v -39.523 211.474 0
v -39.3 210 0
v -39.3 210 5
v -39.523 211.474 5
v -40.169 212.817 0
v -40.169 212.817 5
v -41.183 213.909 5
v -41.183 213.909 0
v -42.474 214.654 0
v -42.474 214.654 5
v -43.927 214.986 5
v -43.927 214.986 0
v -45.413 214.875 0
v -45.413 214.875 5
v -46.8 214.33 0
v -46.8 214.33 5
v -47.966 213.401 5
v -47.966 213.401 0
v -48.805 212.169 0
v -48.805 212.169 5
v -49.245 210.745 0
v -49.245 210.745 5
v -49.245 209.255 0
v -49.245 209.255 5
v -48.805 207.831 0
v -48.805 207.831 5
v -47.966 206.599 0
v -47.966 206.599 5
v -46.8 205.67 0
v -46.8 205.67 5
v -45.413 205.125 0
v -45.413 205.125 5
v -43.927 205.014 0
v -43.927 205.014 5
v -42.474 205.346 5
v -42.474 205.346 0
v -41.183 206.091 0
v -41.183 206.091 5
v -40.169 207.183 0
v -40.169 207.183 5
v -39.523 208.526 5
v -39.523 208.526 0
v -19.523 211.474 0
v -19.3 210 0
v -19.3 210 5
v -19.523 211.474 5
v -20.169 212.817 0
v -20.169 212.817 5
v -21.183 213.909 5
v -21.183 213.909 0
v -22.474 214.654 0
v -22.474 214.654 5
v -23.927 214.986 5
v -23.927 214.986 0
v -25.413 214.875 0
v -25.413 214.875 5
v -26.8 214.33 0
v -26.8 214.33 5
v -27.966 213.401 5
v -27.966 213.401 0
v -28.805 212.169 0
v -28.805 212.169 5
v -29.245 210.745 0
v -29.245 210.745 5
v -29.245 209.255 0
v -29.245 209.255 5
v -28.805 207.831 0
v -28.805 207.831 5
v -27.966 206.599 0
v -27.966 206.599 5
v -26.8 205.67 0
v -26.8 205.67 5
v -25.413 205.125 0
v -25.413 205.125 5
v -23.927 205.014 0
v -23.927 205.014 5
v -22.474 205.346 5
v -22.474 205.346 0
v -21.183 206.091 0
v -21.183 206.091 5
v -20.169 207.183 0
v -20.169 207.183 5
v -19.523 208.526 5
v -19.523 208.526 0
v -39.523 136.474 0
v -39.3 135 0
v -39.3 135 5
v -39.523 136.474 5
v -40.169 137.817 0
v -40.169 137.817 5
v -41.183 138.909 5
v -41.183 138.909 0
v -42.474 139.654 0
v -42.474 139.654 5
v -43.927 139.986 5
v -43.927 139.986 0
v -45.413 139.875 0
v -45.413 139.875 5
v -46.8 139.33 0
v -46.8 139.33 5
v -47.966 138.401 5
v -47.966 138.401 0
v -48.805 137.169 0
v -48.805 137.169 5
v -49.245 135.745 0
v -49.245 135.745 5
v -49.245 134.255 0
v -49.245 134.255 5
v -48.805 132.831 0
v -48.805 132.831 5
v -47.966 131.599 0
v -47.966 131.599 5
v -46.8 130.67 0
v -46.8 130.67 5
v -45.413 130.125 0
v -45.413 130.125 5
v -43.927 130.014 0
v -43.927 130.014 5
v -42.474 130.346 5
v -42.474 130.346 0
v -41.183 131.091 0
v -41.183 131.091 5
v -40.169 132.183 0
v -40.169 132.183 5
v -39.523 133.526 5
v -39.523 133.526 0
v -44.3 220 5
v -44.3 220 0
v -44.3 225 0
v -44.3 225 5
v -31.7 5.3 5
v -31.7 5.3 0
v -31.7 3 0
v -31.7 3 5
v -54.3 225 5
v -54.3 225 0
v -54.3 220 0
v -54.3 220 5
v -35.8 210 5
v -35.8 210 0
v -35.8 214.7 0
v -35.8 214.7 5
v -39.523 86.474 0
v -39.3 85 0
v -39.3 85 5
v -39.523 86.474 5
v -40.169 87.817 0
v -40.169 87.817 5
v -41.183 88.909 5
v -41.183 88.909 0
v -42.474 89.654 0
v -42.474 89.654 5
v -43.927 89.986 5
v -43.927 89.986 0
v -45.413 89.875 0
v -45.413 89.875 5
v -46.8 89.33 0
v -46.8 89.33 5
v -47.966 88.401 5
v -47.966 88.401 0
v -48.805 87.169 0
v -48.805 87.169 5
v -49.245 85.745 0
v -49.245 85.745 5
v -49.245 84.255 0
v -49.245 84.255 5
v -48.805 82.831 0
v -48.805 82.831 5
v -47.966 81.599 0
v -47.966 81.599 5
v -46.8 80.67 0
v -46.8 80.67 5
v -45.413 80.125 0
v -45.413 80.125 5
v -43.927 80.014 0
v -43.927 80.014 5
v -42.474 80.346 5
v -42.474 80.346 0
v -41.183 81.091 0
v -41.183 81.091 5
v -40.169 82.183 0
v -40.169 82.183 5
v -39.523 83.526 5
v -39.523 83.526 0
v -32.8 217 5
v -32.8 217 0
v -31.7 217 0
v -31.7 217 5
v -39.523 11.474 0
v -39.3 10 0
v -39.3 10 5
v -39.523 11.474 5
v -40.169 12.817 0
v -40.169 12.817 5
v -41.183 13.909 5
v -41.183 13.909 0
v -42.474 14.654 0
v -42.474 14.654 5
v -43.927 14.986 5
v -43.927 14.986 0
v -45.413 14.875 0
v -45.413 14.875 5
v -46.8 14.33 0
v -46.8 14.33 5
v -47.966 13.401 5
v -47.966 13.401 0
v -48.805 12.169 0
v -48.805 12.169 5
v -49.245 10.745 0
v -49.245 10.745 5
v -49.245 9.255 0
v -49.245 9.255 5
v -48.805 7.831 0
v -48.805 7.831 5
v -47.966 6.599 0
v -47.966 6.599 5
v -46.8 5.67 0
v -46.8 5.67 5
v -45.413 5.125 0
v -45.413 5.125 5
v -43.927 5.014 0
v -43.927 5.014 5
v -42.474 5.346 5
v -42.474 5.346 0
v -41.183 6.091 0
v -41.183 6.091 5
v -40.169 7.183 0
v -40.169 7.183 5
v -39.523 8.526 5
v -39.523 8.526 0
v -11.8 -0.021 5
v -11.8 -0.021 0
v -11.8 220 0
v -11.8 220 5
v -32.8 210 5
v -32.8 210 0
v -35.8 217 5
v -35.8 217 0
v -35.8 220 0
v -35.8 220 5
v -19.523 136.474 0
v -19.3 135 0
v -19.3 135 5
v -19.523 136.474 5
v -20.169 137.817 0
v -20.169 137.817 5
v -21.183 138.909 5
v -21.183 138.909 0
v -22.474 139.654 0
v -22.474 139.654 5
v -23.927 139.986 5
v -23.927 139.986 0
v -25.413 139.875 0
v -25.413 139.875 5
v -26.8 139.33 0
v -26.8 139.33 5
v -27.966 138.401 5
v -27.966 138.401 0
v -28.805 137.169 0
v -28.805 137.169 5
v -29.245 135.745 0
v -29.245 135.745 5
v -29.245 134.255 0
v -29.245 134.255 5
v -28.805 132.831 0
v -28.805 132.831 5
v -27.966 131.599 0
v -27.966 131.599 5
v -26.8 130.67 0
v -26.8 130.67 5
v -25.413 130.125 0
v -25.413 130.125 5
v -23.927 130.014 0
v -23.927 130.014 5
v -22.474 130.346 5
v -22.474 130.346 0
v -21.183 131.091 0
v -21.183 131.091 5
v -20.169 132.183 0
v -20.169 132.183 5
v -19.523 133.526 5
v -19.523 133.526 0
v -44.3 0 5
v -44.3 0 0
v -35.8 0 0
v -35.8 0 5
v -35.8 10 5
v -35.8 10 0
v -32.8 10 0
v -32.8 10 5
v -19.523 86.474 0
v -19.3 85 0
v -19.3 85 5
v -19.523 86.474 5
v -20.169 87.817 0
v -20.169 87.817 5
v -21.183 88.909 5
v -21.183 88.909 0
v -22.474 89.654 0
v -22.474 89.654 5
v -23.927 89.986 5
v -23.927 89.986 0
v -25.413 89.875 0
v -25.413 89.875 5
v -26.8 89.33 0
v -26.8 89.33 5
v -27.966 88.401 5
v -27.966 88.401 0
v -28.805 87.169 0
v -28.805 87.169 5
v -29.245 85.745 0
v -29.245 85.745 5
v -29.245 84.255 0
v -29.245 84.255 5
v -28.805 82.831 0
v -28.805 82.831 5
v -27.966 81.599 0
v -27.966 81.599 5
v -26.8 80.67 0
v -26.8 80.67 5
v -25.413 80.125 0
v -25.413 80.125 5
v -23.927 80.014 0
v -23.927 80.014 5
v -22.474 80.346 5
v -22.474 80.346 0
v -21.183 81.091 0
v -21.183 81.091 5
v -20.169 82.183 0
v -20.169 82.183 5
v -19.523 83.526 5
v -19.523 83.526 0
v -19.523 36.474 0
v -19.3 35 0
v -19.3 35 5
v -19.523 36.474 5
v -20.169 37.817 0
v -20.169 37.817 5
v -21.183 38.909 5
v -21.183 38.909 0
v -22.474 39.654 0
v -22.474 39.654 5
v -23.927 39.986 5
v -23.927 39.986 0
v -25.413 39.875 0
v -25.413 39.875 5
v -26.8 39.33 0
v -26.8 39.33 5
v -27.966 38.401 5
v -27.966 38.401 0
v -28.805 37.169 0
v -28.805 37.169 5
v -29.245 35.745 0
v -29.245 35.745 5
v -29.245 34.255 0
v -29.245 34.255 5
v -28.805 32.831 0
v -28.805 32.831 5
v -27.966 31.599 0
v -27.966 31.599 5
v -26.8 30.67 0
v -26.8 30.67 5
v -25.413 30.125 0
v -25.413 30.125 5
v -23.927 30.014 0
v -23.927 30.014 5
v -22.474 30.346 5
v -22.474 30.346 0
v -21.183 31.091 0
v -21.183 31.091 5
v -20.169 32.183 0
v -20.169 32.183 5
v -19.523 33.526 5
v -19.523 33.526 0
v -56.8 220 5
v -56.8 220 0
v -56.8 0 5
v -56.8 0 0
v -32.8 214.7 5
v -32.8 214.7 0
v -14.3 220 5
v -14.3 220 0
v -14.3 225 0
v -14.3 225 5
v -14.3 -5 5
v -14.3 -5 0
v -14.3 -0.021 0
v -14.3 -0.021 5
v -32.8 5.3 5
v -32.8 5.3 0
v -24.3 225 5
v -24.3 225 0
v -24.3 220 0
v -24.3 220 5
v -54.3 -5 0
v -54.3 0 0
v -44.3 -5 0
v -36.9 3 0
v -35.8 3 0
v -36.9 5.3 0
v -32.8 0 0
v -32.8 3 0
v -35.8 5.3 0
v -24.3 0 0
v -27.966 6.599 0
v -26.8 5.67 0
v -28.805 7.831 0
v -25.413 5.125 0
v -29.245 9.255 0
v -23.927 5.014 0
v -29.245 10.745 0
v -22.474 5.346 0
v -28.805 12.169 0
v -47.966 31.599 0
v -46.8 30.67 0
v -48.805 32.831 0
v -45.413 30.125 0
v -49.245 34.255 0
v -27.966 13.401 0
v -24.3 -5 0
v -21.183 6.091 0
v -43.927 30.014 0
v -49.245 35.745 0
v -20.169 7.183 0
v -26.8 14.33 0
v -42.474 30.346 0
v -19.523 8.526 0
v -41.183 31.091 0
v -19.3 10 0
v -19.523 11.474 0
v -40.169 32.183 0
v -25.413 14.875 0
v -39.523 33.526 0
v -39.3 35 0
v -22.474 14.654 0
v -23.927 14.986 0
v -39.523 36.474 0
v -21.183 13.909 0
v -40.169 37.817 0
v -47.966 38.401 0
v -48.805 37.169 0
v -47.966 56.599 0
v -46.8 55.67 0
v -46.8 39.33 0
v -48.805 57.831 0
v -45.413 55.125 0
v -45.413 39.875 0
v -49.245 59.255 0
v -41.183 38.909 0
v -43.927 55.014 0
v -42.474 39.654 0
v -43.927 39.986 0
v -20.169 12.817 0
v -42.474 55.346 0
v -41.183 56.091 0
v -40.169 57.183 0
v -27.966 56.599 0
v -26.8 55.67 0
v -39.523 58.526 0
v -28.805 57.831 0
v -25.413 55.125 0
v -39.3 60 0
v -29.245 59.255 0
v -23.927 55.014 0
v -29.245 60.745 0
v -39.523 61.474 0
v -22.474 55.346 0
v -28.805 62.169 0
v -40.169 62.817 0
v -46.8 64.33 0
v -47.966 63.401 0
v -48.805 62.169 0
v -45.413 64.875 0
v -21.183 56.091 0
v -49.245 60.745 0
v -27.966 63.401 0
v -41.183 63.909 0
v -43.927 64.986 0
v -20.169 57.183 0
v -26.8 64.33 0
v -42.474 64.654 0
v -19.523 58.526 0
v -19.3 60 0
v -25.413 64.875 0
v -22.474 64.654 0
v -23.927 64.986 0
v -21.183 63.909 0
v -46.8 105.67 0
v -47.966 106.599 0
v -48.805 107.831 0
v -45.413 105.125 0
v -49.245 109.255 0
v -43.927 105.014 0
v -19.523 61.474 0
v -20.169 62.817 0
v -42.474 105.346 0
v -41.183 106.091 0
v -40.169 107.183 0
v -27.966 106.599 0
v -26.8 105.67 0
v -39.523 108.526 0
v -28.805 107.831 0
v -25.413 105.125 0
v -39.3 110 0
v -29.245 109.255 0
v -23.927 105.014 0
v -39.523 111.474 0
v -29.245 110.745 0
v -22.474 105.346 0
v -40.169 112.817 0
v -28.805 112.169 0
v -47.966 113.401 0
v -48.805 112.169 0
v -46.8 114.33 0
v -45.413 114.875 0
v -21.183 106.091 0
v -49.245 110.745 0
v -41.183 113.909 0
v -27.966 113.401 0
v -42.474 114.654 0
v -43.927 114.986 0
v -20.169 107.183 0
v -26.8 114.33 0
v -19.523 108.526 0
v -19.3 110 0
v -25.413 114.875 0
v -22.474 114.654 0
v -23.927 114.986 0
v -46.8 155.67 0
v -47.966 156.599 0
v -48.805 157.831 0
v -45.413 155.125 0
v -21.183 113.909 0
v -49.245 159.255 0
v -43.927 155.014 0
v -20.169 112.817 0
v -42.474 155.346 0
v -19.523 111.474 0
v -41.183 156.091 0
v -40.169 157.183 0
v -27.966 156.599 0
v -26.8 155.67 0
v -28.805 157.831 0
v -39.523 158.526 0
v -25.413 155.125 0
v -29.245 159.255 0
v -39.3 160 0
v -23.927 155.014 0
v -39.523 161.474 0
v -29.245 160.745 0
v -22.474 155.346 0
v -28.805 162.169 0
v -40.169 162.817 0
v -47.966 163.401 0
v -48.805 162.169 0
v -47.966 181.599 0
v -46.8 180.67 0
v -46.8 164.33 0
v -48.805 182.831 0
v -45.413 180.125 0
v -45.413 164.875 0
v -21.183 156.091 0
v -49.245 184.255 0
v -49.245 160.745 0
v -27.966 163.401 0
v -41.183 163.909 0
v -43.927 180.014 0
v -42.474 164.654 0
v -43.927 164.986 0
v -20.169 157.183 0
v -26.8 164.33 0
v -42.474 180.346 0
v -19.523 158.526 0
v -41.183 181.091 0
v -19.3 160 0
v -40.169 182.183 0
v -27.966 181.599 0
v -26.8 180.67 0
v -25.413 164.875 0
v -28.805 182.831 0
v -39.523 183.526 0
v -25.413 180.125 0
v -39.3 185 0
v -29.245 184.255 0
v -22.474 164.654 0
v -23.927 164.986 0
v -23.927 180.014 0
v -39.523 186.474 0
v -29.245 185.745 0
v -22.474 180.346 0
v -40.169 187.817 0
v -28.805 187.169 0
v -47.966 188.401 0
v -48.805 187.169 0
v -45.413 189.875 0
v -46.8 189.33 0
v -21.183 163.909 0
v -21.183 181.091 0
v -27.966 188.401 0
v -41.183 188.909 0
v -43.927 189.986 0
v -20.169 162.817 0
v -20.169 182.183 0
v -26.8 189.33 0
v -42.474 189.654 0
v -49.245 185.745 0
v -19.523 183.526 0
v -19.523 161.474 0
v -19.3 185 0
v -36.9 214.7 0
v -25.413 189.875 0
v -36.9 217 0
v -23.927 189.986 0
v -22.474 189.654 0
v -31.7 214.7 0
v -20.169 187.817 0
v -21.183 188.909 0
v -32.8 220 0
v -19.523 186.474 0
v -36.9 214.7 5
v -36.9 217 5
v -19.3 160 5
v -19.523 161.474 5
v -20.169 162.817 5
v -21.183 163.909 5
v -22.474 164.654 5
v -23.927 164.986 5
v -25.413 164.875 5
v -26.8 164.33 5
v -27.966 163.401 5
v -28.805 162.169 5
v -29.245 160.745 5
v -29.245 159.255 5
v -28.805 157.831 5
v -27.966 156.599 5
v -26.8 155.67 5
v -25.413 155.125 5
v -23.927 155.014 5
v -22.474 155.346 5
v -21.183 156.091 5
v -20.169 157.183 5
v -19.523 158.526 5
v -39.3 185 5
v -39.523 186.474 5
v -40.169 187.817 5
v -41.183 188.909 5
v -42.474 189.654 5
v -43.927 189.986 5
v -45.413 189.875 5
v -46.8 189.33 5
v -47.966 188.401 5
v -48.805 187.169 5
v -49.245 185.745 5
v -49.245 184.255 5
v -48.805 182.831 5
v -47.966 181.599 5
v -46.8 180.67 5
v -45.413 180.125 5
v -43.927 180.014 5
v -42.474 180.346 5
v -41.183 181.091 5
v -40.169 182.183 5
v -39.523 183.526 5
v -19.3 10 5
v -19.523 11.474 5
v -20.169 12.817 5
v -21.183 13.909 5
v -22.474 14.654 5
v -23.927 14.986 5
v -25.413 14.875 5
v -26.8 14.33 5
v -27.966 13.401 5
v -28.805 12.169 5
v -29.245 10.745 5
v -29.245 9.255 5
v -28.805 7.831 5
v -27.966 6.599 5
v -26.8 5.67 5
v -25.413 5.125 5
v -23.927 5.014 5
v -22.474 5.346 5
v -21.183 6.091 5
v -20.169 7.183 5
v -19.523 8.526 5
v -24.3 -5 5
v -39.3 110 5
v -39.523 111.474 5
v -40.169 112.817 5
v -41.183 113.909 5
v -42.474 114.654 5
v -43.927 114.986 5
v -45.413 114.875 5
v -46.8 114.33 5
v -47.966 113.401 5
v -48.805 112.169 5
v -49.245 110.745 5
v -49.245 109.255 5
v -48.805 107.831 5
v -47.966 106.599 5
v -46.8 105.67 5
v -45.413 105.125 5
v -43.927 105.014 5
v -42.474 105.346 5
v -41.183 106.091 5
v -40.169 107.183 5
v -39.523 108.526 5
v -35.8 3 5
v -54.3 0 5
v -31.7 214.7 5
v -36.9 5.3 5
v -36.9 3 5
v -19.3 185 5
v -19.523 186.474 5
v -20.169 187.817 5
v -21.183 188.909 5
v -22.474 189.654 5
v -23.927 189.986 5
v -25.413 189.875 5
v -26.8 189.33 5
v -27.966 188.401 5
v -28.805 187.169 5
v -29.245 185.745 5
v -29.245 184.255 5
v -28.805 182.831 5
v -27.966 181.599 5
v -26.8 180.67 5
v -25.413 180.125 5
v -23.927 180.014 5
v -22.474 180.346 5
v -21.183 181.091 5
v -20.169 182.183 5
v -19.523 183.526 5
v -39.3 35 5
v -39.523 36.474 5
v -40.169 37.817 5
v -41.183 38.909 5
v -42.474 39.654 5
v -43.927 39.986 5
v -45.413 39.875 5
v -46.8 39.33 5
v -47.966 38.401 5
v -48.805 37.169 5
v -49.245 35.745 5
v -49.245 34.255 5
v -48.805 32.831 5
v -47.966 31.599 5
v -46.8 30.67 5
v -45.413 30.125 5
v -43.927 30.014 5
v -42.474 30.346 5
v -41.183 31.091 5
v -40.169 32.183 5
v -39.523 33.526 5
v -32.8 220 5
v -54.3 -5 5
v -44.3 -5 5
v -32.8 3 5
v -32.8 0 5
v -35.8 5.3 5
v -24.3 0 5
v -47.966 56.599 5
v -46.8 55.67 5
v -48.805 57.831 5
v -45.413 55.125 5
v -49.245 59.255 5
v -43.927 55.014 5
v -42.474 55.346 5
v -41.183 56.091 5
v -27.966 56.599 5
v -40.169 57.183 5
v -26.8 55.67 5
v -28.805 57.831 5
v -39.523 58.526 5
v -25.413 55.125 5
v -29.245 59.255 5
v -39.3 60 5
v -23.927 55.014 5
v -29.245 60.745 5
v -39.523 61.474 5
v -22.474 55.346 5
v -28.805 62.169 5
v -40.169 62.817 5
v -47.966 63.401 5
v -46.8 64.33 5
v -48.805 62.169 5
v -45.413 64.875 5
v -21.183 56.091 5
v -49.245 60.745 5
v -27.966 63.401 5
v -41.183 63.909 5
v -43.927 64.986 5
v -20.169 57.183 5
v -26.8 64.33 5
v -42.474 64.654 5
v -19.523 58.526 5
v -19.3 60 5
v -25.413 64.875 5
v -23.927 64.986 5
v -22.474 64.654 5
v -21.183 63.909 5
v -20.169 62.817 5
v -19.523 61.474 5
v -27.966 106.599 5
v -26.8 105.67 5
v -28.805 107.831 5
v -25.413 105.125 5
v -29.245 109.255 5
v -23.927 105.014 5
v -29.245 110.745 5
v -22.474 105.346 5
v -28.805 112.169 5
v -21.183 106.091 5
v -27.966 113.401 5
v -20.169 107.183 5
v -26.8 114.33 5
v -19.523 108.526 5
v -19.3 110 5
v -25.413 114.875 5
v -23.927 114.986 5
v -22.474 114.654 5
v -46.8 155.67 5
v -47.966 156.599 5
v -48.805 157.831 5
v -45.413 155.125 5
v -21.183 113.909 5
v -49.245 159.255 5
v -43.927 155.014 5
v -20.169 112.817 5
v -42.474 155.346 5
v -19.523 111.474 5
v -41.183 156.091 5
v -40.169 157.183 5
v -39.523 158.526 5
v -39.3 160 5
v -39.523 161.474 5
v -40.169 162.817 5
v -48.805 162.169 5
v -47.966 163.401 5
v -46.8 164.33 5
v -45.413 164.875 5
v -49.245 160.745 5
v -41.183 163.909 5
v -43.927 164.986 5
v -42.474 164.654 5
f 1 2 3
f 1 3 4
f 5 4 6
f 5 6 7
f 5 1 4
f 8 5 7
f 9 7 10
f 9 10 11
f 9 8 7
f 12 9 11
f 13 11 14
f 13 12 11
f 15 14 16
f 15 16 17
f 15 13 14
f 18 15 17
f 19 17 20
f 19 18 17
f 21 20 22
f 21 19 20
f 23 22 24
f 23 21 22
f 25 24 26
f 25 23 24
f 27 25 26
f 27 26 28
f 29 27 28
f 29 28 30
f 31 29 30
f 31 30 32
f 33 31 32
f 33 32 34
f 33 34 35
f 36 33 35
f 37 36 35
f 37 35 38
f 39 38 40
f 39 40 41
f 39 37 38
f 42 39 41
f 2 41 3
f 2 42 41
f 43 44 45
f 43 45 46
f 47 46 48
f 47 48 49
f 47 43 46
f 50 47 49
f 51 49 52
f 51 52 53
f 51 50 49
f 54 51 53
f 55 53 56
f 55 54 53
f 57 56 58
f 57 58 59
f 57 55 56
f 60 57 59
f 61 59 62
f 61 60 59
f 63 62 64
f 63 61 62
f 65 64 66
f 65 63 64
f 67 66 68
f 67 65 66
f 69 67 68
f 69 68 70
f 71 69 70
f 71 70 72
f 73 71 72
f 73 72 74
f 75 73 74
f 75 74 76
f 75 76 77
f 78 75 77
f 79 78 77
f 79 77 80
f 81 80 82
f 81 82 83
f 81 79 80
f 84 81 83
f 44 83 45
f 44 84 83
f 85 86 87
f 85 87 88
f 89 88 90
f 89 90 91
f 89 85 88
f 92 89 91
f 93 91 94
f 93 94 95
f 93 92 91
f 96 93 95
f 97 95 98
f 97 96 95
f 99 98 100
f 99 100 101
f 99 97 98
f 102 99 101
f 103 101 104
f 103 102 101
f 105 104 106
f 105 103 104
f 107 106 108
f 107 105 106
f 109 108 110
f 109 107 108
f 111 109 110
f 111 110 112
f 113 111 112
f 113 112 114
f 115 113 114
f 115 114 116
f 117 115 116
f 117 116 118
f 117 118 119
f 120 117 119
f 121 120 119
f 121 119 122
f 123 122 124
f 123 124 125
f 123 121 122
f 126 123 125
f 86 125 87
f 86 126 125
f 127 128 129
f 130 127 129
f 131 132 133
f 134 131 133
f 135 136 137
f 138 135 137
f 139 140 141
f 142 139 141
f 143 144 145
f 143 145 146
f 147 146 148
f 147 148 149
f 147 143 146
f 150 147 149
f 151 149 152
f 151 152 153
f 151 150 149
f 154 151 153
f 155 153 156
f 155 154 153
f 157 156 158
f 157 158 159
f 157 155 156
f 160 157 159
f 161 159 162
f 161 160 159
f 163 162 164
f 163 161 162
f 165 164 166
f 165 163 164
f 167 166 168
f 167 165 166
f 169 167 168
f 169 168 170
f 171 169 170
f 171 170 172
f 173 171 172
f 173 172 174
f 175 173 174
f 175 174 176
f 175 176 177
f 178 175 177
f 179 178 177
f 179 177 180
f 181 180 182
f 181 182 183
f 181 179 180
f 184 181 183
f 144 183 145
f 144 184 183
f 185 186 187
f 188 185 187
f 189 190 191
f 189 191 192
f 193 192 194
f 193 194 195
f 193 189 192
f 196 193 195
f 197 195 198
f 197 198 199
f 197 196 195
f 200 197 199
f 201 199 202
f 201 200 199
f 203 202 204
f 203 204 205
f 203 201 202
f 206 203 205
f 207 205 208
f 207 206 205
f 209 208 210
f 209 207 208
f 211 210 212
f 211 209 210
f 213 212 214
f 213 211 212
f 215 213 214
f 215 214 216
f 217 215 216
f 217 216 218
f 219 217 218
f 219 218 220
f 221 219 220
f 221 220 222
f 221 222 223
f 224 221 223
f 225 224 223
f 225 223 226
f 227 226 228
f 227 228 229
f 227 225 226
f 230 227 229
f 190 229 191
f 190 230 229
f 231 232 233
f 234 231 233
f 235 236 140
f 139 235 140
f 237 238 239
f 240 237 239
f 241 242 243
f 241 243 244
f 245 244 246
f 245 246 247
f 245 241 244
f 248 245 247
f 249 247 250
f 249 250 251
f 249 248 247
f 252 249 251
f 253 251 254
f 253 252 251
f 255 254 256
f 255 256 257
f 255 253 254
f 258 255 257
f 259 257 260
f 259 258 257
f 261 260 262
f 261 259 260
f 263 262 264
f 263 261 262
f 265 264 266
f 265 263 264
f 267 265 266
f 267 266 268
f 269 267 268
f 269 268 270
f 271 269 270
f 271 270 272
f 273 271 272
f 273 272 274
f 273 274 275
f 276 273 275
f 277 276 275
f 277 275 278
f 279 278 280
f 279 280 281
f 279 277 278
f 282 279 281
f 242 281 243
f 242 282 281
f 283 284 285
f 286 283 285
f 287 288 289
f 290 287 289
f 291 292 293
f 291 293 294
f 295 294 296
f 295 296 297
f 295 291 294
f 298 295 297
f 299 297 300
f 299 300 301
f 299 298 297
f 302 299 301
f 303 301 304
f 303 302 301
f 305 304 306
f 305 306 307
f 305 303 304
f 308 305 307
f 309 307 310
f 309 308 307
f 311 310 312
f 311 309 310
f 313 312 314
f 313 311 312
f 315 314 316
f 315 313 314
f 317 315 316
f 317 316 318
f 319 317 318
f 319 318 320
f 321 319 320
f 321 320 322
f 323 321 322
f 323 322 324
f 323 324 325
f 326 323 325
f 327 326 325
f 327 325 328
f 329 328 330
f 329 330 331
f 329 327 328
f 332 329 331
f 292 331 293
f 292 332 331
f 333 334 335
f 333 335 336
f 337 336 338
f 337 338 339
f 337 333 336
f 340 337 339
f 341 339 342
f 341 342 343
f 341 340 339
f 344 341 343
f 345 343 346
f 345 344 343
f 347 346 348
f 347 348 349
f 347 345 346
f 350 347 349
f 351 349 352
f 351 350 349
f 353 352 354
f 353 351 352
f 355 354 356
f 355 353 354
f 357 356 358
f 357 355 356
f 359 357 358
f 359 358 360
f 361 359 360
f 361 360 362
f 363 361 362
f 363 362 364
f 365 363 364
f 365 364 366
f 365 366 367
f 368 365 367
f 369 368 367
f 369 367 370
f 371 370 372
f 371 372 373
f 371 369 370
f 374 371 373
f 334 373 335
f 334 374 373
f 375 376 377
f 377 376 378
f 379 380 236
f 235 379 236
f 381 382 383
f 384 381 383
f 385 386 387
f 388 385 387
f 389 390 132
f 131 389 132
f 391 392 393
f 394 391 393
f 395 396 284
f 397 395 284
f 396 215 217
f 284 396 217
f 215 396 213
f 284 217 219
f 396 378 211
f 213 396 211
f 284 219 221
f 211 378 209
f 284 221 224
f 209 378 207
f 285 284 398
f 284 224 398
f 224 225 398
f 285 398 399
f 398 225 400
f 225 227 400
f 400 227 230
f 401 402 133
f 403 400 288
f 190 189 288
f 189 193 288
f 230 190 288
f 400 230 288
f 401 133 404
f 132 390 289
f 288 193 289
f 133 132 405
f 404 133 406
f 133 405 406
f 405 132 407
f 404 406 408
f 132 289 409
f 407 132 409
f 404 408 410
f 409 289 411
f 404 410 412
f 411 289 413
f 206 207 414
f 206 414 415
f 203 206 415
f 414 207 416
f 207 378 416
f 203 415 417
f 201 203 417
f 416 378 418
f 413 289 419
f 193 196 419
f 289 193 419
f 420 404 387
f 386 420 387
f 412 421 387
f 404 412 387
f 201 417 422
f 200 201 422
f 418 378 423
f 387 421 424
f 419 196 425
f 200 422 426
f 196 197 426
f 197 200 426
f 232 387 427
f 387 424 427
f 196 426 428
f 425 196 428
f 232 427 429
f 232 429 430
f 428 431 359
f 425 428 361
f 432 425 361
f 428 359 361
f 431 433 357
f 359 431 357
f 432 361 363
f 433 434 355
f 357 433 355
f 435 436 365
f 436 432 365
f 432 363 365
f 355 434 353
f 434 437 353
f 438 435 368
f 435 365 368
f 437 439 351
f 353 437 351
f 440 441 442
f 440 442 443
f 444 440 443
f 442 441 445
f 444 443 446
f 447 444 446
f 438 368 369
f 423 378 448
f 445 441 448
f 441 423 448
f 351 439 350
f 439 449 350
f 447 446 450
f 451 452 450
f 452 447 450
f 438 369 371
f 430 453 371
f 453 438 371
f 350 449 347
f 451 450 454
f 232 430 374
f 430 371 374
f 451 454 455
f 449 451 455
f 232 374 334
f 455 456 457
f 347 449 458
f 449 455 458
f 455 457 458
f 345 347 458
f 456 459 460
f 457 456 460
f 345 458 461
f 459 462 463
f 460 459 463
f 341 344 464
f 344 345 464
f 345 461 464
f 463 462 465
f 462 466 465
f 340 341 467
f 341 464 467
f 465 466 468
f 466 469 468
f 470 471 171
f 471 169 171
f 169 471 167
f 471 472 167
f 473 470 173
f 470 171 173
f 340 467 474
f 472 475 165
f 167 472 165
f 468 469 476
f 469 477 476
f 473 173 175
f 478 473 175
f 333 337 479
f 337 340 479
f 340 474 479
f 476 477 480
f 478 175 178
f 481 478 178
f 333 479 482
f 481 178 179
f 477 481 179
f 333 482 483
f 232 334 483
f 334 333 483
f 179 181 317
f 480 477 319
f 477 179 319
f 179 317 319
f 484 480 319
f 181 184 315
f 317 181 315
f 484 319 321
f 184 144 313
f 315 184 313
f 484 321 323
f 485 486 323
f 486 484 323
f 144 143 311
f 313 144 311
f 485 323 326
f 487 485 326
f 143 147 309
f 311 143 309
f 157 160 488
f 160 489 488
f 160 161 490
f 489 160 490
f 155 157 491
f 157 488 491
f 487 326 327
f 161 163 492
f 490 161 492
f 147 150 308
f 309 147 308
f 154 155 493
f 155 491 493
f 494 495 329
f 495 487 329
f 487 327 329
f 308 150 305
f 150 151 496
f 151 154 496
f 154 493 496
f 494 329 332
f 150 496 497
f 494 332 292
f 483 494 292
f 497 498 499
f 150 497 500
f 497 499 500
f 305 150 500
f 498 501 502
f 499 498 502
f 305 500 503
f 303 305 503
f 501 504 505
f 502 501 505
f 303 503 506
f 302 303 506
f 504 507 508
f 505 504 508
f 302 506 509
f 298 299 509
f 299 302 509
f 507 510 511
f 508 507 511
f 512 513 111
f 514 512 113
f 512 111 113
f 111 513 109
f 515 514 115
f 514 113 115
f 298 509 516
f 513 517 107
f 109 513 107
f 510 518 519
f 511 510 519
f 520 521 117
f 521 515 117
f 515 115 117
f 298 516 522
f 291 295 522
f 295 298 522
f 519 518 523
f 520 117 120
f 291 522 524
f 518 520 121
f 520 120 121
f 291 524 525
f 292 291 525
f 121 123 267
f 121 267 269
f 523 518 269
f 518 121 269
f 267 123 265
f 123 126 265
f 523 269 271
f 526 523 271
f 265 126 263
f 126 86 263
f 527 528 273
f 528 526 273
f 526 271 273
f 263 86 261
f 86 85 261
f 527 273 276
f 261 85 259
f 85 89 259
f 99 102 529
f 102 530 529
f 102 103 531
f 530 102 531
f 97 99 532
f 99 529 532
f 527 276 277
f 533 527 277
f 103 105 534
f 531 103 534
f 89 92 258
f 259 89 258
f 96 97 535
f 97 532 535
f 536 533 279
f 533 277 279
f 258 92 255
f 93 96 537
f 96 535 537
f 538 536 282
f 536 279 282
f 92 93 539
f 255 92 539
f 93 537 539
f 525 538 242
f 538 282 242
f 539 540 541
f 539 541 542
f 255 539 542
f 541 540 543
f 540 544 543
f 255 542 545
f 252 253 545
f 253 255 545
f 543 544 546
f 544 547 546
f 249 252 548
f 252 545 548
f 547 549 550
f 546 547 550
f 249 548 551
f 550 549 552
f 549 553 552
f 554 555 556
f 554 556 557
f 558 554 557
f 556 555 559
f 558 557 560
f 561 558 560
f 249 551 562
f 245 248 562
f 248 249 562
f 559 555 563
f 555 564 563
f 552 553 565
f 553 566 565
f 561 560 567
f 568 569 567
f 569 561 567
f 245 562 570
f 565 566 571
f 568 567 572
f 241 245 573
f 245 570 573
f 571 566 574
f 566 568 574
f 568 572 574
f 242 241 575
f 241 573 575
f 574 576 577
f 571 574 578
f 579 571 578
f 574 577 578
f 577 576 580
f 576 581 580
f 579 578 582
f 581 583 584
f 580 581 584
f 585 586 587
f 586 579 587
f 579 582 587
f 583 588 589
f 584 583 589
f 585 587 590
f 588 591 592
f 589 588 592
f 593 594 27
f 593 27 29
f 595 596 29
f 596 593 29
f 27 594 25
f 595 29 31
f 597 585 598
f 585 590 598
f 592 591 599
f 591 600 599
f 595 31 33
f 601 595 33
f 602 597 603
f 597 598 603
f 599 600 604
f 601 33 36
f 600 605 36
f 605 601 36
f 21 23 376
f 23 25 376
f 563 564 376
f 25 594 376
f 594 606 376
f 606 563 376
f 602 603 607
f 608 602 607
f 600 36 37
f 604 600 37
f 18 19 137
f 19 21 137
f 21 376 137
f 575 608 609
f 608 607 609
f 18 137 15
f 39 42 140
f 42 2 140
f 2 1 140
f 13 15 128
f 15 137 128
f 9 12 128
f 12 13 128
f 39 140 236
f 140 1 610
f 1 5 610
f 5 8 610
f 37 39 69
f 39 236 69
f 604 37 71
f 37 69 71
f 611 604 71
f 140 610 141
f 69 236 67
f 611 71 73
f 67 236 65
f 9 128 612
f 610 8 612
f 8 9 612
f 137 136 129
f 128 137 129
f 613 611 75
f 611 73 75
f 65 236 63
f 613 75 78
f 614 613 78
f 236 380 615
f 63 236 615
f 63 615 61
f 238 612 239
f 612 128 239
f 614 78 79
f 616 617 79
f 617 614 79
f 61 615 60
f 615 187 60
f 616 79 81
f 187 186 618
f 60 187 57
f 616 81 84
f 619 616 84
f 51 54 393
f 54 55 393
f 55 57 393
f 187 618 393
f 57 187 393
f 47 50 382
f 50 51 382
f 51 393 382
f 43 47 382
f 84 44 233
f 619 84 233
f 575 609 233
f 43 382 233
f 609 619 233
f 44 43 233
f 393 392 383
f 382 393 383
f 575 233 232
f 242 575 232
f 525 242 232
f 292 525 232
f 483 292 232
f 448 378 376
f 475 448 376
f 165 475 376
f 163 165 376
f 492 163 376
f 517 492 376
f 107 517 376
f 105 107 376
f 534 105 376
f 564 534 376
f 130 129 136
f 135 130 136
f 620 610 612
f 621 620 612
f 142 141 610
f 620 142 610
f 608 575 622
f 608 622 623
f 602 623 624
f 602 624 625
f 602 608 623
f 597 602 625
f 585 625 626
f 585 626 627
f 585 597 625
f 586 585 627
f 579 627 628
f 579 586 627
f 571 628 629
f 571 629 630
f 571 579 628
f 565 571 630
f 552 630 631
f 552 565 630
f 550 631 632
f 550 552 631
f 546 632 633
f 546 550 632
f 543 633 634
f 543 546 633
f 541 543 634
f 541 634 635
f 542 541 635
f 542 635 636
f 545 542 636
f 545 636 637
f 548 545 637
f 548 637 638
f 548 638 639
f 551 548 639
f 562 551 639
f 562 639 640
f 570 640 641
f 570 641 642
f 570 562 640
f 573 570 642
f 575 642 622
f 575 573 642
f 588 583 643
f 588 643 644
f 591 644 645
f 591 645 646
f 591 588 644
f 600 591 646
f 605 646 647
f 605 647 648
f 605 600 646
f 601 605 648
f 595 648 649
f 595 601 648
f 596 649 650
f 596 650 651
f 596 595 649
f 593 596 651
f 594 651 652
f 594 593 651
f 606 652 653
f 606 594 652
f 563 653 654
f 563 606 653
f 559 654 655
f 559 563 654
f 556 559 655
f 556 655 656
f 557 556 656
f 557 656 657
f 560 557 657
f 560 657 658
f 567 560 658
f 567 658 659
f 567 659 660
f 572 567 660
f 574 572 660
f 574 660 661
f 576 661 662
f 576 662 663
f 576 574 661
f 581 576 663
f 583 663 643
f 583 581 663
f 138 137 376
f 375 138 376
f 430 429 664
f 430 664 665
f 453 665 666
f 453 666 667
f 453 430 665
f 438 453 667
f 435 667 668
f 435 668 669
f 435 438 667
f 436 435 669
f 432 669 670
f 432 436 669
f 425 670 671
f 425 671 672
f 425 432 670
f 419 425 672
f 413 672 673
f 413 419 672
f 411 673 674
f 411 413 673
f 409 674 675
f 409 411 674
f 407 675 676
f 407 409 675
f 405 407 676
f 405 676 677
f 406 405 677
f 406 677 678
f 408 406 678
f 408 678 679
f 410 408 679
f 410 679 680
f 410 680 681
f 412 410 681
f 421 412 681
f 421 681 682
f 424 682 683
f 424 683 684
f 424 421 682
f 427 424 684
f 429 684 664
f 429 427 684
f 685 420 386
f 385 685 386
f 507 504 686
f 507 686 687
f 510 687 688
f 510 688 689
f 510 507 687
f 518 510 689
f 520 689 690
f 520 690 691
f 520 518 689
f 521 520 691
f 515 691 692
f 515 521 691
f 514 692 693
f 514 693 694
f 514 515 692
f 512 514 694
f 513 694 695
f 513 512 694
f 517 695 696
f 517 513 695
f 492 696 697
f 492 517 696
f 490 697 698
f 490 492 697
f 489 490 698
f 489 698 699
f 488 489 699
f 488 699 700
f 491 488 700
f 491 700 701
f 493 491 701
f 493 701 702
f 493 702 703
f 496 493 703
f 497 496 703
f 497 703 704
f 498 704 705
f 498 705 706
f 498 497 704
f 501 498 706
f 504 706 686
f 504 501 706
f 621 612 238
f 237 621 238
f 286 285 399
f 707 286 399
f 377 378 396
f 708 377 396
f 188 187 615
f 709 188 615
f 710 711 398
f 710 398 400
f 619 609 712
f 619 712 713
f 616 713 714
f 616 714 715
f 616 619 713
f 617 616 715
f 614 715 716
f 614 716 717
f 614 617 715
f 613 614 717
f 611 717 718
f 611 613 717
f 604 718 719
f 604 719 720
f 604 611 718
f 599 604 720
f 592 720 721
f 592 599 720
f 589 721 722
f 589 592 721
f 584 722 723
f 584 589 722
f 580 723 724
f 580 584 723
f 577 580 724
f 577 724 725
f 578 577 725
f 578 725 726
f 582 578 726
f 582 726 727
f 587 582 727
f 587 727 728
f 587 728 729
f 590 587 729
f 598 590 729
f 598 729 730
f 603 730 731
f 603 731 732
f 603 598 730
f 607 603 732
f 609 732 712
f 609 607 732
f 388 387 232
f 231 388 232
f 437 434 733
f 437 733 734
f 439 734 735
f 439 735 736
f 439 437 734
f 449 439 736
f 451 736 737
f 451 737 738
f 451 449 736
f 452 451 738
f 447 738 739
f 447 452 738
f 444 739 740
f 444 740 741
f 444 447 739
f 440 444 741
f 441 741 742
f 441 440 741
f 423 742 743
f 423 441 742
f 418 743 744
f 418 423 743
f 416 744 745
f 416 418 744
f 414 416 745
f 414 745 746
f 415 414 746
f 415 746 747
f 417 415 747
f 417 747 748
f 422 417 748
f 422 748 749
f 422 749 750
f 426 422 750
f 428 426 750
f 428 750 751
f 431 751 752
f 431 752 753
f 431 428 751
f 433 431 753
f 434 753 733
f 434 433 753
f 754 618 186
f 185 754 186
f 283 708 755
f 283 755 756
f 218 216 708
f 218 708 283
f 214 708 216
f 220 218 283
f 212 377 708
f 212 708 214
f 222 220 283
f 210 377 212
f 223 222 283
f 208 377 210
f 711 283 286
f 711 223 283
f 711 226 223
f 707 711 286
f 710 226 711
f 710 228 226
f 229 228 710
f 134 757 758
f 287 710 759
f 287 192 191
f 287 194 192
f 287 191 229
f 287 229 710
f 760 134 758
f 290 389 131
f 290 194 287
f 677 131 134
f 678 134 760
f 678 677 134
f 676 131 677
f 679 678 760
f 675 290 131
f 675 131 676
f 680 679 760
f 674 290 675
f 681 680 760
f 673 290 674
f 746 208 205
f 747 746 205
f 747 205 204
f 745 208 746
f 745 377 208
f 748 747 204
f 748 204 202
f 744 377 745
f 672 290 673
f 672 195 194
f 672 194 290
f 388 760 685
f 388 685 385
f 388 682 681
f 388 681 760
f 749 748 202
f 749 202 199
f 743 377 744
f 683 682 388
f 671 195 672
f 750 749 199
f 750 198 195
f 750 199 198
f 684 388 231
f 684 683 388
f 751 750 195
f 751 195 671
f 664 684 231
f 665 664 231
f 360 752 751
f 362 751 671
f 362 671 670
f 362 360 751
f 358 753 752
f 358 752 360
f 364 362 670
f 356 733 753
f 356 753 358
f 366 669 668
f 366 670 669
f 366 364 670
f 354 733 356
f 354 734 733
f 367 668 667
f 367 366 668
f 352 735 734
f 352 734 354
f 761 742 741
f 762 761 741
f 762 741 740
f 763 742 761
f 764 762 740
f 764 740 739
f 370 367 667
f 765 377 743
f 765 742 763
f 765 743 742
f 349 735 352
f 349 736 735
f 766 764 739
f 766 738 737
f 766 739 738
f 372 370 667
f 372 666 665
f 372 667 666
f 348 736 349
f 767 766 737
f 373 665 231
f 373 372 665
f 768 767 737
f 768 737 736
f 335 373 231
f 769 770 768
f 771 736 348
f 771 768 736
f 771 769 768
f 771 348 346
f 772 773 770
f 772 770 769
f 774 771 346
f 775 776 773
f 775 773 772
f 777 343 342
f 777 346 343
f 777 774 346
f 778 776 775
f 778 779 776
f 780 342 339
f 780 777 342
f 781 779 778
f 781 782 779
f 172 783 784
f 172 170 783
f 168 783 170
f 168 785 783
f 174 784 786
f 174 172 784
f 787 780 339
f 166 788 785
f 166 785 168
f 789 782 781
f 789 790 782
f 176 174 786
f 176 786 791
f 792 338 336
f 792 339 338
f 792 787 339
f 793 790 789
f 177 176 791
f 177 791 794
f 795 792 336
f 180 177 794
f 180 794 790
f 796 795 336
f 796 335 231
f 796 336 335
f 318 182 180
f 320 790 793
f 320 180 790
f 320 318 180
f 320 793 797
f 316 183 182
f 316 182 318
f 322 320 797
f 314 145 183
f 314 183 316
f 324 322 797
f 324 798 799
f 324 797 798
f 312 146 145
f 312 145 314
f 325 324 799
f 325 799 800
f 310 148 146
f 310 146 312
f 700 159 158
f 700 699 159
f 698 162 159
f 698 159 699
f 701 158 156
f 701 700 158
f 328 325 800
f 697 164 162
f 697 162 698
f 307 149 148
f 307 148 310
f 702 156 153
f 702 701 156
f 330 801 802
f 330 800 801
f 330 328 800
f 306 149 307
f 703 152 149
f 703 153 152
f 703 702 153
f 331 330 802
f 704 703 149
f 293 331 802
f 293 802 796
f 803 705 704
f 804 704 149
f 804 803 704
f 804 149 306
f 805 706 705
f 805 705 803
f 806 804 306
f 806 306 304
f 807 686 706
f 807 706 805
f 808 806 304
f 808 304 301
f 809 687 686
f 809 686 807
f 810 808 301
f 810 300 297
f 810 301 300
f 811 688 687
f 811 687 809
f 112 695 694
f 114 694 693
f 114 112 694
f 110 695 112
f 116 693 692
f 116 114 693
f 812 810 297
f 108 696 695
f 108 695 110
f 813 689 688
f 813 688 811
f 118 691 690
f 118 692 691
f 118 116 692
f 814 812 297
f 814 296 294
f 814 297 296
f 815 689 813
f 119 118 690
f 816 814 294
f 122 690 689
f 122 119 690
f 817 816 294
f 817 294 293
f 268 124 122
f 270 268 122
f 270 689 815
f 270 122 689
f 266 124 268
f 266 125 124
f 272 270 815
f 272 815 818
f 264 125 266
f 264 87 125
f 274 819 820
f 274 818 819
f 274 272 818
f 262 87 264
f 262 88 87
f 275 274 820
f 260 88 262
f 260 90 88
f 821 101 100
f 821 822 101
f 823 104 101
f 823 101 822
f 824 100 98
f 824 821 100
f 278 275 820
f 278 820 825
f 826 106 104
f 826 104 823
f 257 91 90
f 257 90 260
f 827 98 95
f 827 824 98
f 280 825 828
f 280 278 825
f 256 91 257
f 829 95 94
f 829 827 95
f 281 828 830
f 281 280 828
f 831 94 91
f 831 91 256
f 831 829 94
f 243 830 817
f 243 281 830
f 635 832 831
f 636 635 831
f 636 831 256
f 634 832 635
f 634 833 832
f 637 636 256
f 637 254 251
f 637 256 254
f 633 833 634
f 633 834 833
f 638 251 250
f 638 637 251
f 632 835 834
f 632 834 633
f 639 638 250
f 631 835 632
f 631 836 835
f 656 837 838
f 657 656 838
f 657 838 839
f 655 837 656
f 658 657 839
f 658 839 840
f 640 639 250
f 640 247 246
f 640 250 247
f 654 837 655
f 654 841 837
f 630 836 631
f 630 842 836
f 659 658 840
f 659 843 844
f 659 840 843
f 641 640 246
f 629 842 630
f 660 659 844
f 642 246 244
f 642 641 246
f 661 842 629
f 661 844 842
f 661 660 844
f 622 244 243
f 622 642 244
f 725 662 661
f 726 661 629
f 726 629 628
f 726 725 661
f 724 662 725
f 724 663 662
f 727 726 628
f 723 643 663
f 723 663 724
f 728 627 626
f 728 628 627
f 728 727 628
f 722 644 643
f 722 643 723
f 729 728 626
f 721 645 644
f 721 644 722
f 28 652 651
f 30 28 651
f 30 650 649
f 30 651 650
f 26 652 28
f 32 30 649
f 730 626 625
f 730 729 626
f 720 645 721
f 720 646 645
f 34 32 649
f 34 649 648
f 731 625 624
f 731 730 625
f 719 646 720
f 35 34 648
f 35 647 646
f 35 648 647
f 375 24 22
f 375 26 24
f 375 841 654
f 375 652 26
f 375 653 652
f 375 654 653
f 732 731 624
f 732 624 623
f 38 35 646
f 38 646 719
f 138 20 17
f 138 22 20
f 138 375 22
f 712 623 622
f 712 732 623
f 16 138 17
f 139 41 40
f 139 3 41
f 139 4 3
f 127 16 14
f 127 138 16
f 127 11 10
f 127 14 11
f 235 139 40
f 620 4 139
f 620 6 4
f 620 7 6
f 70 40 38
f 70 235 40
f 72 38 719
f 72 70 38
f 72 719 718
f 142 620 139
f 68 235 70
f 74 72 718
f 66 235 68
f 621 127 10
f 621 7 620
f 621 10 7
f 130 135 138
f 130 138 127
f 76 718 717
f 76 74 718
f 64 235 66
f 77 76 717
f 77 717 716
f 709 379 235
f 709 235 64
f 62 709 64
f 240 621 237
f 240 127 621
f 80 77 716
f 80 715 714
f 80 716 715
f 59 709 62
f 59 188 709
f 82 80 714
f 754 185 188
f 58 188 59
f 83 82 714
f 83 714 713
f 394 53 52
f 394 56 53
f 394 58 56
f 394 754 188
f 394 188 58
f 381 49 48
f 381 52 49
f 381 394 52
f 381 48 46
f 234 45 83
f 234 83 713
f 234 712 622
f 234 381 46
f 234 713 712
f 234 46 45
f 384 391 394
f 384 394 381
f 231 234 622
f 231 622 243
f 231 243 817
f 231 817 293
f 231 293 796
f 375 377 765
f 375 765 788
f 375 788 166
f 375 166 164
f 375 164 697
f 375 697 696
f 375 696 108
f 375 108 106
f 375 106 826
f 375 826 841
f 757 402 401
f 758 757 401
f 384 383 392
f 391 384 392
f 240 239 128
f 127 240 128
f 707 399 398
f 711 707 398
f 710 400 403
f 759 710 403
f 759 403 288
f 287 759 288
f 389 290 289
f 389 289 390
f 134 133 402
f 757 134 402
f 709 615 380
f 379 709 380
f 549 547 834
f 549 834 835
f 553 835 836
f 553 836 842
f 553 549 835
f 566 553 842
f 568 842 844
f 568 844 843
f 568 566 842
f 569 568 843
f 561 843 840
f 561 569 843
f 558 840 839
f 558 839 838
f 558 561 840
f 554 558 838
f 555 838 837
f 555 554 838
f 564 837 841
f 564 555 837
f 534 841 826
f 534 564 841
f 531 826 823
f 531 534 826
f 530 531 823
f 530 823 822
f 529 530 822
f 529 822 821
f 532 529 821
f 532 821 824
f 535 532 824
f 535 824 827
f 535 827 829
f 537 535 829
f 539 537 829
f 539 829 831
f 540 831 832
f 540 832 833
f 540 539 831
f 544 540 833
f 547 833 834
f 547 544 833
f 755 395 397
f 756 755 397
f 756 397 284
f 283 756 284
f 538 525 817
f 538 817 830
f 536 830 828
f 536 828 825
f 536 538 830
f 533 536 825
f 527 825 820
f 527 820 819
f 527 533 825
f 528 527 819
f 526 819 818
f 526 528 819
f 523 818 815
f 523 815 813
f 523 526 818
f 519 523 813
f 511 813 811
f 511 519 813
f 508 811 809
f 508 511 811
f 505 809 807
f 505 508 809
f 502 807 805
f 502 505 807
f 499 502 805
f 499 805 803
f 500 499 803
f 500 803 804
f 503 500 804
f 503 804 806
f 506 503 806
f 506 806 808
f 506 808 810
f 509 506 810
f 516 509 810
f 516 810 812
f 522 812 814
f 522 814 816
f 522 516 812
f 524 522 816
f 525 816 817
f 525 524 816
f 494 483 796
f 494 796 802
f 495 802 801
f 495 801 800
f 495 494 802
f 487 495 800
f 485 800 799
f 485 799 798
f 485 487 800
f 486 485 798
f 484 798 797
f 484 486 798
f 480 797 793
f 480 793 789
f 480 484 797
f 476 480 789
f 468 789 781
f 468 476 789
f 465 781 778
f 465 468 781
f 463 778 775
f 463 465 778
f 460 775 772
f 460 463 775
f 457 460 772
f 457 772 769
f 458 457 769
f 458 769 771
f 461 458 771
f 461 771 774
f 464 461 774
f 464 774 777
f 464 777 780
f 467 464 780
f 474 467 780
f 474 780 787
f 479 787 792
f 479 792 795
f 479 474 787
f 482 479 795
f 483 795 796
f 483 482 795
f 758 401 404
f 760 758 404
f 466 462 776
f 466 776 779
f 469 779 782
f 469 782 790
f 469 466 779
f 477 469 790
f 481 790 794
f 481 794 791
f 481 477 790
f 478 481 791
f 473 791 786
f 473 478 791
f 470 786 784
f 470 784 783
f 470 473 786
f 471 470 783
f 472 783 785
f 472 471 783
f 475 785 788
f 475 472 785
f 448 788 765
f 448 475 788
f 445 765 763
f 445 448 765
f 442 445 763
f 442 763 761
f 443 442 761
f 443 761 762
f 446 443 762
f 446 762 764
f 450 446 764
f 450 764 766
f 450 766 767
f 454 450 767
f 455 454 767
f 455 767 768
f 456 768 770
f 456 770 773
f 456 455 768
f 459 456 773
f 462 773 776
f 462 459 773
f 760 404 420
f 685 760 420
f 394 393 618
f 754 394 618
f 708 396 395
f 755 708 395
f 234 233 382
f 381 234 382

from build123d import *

# Parameters (mm, degrees)
SKETCH1_R           = 5
BOSS_EXTRUDE1_DEPTH = 5


with BuildPart() as part:
    # Sketch1 → Boss-Extrude1 (new body)
    with BuildSketch(Plane.XY):
        Polygon((-56.800385751, 0), (-54.300385751, 0), (-54.300385751, -5), (-44.300385751, -5), (-44.300385751, 0), (-35.800385751, 0), (-35.800385751, 3), (-36.900385751, 3), (-36.900385751, 5.3), (-35.800385751, 5.3), (-35.800385751, 10), (-32.800385751, 10), (-32.800385751, 5.3), (-31.700385751, 5.3), (-31.700385751, 3), (-32.800385751, 3), (-32.800385751, 0), (-24.300385751, 0), (-24.300385751, -5), (-14.300385751, -5), (-14.300385751, -0.020707798), (-11.800385751, -0.020707798), (-11.800385751, 220), (-14.300385751, 220), (-14.300385751, 225), (-24.300385751, 225), (-24.300385751, 220), (-32.800385751, 220), (-32.800385751, 217), (-31.700385751, 217), (-31.700385751, 214.7), (-32.800385751, 214.7), (-32.800385751, 210), (-35.800385751, 210), (-35.800385751, 214.7), (-36.900385751, 214.7), (-36.900385751, 217), (-35.800385751, 217), (-35.800385751, 220), (-44.300385751, 220), (-44.300385751, 225), (-54.300385751, 225), (-54.300385751, 220), (-56.800385751, 220), align=None)
        with Locations((-44.300385751, 210)):
            Circle(SKETCH1_R, mode=Mode.SUBTRACT)
        with Locations((-24.300385751, 210)):
            Circle(SKETCH1_R, mode=Mode.SUBTRACT)
        with Locations((-24.300385751, 185)):
            Circle(SKETCH1_R, mode=Mode.SUBTRACT)
        with Locations((-24.300385751, 160)):
            Circle(SKETCH1_R, mode=Mode.SUBTRACT)
        with Locations((-24.300385751, 135)):
            Circle(SKETCH1_R, mode=Mode.SUBTRACT)
        with Locations((-24.300385751, 110)):
            Circle(SKETCH1_R, mode=Mode.SUBTRACT)
        with Locations((-24.300385751, 85)):
            Circle(SKETCH1_R, mode=Mode.SUBTRACT)
        with Locations((-24.300385751, 60)):
            Circle(SKETCH1_R, mode=Mode.SUBTRACT)
        with Locations((-24.300385751, 35)):
            Circle(SKETCH1_R, mode=Mode.SUBTRACT)
        with Locations((-24.300385751, 10)):
            Circle(SKETCH1_R, mode=Mode.SUBTRACT)
        with Locations((-44.300385751, 185)):
            Circle(SKETCH1_R, mode=Mode.SUBTRACT)
        with Locations((-44.300385751, 160)):
            Circle(SKETCH1_R, mode=Mode.SUBTRACT)
        with Locations((-44.300385751, 135)):
            Circle(SKETCH1_R, mode=Mode.SUBTRACT)
        with Locations((-44.300385751, 110)):
            Circle(SKETCH1_R, mode=Mode.SUBTRACT)
        with Locations((-44.300385751, 85)):
            Circle(SKETCH1_R, mode=Mode.SUBTRACT)
        with Locations((-44.300385751, 60)):
            Circle(SKETCH1_R, mode=Mode.SUBTRACT)
        with Locations((-44.300385751, 35)):
            Circle(SKETCH1_R, mode=Mode.SUBTRACT)
        with Locations((-44.300385751, 10)):
            Circle(SKETCH1_R, mode=Mode.SUBTRACT)
    extrude(amount=BOSS_EXTRUDE1_DEPTH)


solid = part.part
